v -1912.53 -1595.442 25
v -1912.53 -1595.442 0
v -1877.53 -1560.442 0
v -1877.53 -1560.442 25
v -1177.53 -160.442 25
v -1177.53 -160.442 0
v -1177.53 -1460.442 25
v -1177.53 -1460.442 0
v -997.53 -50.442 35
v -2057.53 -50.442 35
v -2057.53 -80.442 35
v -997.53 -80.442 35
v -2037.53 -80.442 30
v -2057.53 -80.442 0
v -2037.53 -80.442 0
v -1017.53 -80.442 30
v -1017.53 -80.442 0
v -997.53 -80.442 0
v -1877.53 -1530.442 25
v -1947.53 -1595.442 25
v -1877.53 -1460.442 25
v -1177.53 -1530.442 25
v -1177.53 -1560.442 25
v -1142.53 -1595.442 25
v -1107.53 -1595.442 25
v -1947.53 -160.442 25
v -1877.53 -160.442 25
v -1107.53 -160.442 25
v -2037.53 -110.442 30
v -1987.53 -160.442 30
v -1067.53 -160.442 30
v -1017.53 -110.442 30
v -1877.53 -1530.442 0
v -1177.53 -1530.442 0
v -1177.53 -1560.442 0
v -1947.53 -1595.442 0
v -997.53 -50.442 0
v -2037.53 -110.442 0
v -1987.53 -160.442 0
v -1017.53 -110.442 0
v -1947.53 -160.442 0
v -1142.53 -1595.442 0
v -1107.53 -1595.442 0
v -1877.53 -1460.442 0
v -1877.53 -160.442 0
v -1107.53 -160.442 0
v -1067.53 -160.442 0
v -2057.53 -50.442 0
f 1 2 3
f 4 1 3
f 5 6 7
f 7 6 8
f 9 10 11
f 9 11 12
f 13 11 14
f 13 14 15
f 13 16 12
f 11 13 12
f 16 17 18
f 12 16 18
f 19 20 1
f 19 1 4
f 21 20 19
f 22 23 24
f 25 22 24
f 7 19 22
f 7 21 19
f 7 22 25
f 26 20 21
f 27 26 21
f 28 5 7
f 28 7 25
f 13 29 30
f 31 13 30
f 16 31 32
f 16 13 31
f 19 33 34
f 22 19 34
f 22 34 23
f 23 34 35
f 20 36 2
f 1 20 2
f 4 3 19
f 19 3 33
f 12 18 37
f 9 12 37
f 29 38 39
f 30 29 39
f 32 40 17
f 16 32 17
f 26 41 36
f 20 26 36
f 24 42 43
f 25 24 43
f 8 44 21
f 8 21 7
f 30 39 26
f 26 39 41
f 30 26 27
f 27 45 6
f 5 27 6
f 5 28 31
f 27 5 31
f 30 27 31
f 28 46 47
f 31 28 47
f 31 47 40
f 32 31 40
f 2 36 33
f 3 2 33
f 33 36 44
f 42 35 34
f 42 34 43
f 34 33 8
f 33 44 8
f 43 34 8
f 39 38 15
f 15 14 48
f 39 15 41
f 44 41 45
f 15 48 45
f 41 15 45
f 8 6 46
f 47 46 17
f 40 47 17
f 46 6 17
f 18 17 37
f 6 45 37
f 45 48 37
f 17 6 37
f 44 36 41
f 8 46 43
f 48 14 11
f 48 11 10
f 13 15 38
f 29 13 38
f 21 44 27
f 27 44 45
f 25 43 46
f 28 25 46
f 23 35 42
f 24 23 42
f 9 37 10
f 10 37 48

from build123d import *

# Parameters (mm, degrees)
F1_DEPTH = 30
F0_W     = 20
F0_H     = 30
F0_W_2   = 1020
F2_DEPTH = 35
F0_W_3   = 700
F0_H_2   = 70
F3_DEPTH = 25


with BuildPart() as f1:
    # F0 (on Top) → F1 (new body)
    with BuildSketch(Plane.XY):
        Polygon((-1947.5297451019, -160.4416549206), (-1877.5297451019, -160.4416549206), (-1177.5297451019, -160.4416549206), (-1107.5297451019, -160.4416549206), (-1067.5297451019, -160.4416549206), (-1017.5297451019, -110.4416549206), (-1017.5297451019, -80.4416549206), (-2037.5297451019, -80.4416549206), (-2037.5297451019, -110.4416549206), (-1987.5297451019, -160.4416549206), align=None)
    extrude(amount=F1_DEPTH)

    # F0 (on Top) → F2 (join)
    with BuildSketch(Plane.XY):
        with Locations((-2047.5297451019, -65.4416549206)):
            Rectangle(F0_W, F0_H)
        with Locations((-1527.5297451019, -65.4416549206)):
            Rectangle(F0_W_2, F0_H)
        with Locations((-1007.5297451019, -65.4416549206)):
            Rectangle(F0_W, F0_H)
    extrude(amount=F2_DEPTH)

    # F0 (on Top) → F3 (join)
    with BuildSketch(Plane.XY):
        Polygon((-1877.5297451019, -1460.4416549206), (-1877.5297451019, -160.4416549206), (-1947.5297451019, -160.4416549206), (-1947.5297451019, -1595.4416549206), (-1912.5297451019, -1595.4416549206), (-1877.5297451019, -1560.4416549206), (-1877.5297451019, -1530.4416549206), align=None)
        with Locations((-1527.5297451019, -1495.4416549206)):
            Rectangle(F0_W_3, F0_H_2)
        Polygon((-1107.5297451019, -160.4416549206), (-1177.5297451019, -160.4416549206), (-1177.5297451019, -1460.4416549206), (-1177.5297451019, -1530.4416549206), (-1177.5297451019, -1560.4416549206), (-1142.5297451019, -1595.4416549206), (-1107.5297451019, -1595.4416549206), align=None)
    extrude(amount=F3_DEPTH)


solid = f1.part
